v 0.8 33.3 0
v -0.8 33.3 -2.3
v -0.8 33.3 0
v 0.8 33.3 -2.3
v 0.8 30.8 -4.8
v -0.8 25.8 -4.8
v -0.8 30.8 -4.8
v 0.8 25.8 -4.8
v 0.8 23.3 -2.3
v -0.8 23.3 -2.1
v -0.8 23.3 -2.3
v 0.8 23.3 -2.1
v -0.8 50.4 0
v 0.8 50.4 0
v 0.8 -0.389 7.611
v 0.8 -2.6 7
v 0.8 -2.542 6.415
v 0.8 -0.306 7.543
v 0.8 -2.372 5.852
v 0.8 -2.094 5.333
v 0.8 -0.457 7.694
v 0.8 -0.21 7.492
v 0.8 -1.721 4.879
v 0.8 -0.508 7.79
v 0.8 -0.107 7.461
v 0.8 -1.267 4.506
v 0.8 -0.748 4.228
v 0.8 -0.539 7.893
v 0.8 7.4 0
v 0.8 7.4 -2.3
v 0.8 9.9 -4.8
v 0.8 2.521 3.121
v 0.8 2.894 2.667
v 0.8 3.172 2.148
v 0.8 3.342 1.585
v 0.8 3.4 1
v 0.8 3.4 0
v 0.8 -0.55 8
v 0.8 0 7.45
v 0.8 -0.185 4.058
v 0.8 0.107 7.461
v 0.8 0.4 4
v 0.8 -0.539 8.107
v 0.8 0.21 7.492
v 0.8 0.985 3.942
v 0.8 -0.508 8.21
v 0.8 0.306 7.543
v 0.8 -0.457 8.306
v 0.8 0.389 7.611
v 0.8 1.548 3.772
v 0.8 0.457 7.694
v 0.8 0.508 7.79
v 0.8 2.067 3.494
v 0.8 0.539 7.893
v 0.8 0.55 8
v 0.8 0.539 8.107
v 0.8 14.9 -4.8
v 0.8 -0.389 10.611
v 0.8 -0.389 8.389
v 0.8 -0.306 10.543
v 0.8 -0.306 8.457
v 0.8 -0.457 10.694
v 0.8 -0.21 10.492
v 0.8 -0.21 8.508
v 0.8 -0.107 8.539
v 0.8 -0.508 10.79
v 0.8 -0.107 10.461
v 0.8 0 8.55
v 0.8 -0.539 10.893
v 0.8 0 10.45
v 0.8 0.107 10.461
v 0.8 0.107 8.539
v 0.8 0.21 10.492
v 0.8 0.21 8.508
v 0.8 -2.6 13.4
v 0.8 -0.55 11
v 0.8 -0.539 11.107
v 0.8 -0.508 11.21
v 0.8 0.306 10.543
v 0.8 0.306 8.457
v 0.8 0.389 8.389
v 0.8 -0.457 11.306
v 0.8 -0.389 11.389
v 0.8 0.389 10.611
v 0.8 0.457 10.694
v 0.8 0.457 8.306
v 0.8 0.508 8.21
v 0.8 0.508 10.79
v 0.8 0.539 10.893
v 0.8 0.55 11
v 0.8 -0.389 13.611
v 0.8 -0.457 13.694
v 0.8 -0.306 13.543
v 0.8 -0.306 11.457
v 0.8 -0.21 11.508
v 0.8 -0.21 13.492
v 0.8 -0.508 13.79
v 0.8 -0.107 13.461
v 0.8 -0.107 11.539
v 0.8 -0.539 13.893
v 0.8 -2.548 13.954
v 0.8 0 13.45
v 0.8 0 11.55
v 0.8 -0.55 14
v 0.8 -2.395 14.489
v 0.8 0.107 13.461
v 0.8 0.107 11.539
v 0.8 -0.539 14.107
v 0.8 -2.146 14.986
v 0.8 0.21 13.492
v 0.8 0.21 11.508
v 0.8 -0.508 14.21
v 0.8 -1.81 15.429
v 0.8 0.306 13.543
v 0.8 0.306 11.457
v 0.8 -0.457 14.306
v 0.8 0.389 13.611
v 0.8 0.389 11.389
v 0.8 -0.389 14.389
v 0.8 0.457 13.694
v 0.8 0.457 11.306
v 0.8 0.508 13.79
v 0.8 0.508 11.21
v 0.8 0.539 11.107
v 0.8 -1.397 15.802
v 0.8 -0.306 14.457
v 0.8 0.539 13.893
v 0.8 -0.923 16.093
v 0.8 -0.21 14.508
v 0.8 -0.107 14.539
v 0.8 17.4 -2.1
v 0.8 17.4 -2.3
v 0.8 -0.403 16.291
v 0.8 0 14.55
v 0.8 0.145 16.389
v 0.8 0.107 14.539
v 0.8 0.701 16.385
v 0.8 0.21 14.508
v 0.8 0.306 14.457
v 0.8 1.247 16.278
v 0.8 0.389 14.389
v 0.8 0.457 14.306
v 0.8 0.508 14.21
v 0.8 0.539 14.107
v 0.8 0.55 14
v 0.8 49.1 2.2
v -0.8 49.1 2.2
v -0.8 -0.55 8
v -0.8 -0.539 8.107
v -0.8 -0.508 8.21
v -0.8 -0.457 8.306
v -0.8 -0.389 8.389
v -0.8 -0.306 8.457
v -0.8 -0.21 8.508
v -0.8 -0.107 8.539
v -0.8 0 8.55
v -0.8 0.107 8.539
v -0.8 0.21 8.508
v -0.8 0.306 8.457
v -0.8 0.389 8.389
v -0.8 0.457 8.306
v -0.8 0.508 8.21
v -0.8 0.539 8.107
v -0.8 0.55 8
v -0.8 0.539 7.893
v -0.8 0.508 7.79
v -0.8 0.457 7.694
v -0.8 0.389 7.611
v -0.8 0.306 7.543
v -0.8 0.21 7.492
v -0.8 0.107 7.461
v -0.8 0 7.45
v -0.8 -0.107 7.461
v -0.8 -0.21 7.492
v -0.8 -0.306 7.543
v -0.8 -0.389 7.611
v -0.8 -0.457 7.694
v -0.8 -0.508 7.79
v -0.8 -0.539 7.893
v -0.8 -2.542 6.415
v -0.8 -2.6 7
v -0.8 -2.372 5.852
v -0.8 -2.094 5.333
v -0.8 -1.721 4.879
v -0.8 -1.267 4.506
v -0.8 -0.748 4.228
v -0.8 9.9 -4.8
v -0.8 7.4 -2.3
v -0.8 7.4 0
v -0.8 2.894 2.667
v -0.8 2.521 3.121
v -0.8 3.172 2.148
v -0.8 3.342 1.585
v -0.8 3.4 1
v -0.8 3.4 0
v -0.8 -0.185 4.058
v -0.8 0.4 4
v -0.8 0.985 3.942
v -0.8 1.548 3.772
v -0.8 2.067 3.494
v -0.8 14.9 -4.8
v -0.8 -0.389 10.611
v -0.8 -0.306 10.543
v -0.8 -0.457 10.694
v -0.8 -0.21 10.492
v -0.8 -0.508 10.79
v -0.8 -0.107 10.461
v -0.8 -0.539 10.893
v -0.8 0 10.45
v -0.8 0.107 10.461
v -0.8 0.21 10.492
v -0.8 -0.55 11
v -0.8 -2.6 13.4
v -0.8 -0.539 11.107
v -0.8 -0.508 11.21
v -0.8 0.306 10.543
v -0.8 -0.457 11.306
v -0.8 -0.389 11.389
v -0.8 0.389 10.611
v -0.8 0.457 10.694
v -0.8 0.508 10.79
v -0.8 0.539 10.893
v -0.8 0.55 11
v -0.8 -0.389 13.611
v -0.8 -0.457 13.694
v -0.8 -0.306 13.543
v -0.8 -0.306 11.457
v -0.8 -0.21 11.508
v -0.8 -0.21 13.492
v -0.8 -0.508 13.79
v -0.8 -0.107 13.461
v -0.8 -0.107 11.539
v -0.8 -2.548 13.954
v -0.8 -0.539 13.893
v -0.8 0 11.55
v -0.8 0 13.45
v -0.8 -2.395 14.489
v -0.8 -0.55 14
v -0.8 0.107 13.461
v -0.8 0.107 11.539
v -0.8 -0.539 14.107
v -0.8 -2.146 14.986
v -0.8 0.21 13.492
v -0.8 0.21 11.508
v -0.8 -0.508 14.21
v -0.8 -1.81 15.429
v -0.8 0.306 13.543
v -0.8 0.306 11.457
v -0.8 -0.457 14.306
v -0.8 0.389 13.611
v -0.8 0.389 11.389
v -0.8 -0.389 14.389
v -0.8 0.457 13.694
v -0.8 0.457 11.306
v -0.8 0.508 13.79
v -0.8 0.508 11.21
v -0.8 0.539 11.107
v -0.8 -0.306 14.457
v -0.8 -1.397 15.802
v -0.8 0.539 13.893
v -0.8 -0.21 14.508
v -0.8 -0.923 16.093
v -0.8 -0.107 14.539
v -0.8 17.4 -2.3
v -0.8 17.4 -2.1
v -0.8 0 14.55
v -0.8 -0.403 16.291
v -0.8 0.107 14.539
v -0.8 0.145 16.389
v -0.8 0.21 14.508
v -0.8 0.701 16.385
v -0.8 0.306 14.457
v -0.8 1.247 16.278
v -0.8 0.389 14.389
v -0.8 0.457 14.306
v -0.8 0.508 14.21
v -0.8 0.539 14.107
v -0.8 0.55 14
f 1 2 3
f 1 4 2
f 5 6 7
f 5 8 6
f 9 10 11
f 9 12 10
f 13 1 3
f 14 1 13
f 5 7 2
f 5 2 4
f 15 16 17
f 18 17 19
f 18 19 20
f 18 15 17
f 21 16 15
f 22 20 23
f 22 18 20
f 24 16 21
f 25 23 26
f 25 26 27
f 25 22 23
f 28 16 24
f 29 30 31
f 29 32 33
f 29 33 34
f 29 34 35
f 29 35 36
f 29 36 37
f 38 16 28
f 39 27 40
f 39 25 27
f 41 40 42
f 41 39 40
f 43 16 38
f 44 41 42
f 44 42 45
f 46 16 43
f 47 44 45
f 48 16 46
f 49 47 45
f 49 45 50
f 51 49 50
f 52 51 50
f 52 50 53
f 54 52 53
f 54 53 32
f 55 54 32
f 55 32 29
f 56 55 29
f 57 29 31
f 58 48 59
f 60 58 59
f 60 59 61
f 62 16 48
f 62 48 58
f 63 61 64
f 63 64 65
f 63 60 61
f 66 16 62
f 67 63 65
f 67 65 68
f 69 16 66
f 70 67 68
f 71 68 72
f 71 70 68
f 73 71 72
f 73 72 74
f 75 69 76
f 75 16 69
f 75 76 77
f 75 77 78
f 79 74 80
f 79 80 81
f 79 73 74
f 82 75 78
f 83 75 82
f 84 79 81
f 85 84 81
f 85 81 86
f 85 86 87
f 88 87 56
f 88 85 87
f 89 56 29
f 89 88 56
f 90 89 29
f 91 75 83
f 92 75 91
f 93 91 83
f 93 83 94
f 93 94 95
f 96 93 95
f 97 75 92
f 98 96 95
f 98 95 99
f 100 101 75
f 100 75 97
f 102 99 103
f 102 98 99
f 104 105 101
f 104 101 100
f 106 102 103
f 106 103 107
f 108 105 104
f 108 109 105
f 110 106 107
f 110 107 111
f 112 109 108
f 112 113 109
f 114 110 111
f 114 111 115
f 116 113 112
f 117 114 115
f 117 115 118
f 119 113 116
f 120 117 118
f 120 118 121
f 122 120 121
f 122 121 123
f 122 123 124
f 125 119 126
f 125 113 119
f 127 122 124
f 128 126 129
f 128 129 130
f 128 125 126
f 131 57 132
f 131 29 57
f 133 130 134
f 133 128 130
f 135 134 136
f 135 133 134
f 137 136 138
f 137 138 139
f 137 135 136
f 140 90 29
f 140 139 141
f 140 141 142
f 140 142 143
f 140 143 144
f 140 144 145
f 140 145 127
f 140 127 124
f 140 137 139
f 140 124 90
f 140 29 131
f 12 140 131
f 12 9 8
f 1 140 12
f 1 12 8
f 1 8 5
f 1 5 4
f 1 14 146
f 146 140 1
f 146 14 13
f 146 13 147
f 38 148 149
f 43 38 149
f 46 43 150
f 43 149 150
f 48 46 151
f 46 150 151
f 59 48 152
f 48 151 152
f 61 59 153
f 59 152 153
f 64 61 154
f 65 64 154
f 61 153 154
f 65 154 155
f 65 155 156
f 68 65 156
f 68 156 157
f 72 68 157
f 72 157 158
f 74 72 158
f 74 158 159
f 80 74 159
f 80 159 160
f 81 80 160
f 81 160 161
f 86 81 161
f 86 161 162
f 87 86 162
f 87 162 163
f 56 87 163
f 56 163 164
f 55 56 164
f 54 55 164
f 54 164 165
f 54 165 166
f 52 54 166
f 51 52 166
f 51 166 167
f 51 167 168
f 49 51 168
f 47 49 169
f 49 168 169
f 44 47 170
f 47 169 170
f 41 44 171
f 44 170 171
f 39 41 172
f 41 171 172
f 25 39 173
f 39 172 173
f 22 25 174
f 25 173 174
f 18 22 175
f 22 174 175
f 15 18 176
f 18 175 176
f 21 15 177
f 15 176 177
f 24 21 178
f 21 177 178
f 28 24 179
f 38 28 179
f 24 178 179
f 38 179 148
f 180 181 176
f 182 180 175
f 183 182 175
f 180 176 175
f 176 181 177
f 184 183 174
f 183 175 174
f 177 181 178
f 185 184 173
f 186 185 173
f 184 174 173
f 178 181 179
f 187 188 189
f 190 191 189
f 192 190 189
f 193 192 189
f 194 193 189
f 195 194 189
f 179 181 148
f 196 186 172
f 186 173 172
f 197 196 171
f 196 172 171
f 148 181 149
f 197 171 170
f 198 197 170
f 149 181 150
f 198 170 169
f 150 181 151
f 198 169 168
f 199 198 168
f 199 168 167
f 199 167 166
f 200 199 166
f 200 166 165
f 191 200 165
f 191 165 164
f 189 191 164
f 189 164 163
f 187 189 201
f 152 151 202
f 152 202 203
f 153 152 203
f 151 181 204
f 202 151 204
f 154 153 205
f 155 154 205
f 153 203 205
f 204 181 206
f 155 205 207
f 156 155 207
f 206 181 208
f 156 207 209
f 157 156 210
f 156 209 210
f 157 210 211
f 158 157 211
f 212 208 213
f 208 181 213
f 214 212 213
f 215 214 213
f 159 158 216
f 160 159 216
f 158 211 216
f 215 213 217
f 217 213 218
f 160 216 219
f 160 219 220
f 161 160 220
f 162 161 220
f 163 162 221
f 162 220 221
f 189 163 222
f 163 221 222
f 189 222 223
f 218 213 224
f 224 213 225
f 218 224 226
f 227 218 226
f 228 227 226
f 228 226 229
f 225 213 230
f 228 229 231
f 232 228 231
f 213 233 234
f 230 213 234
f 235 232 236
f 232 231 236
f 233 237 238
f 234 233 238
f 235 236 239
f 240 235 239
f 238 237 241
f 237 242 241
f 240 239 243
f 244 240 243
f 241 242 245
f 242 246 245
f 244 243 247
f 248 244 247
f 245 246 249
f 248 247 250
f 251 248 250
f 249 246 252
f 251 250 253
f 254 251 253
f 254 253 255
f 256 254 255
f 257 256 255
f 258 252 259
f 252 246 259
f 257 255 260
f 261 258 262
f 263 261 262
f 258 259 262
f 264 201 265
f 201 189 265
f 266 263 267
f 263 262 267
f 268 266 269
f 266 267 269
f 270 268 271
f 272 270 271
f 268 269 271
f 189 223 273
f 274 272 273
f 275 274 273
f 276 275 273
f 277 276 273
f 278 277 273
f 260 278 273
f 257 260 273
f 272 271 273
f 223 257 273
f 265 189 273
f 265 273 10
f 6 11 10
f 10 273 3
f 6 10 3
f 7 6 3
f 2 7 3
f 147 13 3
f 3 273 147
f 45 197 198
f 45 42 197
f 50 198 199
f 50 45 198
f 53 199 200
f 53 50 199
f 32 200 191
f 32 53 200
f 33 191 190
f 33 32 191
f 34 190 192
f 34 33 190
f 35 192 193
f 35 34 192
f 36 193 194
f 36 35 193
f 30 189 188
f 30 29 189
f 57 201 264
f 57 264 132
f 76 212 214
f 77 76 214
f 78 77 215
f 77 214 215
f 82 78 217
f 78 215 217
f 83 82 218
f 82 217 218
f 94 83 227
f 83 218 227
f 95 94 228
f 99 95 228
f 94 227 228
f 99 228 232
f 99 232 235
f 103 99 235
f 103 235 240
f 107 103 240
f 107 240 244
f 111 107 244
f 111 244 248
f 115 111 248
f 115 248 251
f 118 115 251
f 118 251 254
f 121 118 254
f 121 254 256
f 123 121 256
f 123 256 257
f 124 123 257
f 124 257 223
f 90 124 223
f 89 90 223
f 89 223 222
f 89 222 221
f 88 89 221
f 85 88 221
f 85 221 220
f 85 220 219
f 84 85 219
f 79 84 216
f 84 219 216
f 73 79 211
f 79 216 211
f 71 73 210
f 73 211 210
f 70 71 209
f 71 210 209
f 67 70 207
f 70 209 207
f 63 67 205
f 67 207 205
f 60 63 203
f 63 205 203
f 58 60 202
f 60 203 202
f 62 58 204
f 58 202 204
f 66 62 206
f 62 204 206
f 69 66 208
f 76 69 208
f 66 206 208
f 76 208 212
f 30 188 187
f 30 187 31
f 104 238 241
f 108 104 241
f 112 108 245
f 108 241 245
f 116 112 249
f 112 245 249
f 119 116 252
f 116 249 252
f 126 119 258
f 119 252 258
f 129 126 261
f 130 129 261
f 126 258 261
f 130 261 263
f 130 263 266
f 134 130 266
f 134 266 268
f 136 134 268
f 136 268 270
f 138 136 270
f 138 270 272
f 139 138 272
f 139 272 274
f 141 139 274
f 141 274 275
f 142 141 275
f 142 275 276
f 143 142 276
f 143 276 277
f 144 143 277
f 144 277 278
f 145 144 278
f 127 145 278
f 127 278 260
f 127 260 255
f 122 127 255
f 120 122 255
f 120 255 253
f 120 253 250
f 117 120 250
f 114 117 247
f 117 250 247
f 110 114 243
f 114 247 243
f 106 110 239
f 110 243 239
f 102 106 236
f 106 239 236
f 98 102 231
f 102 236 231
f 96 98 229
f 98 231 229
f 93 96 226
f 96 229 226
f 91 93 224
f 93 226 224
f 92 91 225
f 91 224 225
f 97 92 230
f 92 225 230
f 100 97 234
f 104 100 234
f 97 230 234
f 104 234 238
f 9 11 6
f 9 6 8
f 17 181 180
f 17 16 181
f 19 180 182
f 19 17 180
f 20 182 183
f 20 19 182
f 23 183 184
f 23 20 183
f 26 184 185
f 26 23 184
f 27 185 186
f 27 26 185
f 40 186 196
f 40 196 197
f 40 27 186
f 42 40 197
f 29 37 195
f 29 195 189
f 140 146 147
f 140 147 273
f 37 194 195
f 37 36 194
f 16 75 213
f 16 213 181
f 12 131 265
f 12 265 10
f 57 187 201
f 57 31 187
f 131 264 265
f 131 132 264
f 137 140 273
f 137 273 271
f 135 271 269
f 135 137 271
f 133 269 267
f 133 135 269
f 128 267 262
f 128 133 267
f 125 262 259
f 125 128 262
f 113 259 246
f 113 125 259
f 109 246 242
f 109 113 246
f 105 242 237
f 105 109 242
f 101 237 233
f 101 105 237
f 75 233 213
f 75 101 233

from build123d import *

# Parameters (mm, degrees)
F1_DEPTH = 0.8
F2_SIZE  = 2.5
F4_D     = 1.1


with BuildPart() as f1:
    # F0 (on Right) → F1 (new body, symmetric)
    with BuildSketch(Plane.YZ):
        with BuildLine():
            Line((3.4, 1), (3.4, 0))
            Line((3.4, 0), (7.4, 0))
            Line((7.4, 0), (7.4, -4.8))
            Line((7.4, -4.8), (17.4, -4.8))
            Line((17.4, -4.8), (17.4, -2.1))
            Line((17.4, -2.1), (23.3, -2.1))
            Line((23.3, -2.1), (23.3, -4.8))
            Line((23.3, -4.8), (33.3, -4.8))
            Line((33.3, -4.8), (33.3, 0))
            Line((33.3, 0), (50.4, 0))
            Line((50.4, 0), (49.1, 2.2))
            Line((49.1, 2.2), (1.2466947794, 16.278038907))
            ThreePointArc((1.2466947794, 16.278038907), (-1.3972083437, 15.8020912075), (-2.6, 13.4))
            Line((-2.6, 13.4), (-2.6, 7))
            ThreePointArc((-2.6, 7), (-1.7213203436, 4.8786796564), (0.4, 4))
            ThreePointArc((0.4, 4), (2.5213203436, 3.1213203436), (3.4, 1))
        make_face()
    extrude(amount=F1_DEPTH, both=True)

    # F2
    f2_edges = [f1.edges().sort_by_distance(p)[0] for p in [
        (0, 7.4, -4.8),
        (0, 23.3, -4.8),
        (0, 17.4, -4.8),
        (0, 33.3, -4.8),
    ]]
    chamfer(f2_edges, length=F2_SIZE)

    # F4 (through all)
    with Locations(Plane.YZ.offset(0.8)):
        with Locations((0, 14), (0, 11), (0, 8)):
            Hole(F4_D / 2)


solid = f1.part
